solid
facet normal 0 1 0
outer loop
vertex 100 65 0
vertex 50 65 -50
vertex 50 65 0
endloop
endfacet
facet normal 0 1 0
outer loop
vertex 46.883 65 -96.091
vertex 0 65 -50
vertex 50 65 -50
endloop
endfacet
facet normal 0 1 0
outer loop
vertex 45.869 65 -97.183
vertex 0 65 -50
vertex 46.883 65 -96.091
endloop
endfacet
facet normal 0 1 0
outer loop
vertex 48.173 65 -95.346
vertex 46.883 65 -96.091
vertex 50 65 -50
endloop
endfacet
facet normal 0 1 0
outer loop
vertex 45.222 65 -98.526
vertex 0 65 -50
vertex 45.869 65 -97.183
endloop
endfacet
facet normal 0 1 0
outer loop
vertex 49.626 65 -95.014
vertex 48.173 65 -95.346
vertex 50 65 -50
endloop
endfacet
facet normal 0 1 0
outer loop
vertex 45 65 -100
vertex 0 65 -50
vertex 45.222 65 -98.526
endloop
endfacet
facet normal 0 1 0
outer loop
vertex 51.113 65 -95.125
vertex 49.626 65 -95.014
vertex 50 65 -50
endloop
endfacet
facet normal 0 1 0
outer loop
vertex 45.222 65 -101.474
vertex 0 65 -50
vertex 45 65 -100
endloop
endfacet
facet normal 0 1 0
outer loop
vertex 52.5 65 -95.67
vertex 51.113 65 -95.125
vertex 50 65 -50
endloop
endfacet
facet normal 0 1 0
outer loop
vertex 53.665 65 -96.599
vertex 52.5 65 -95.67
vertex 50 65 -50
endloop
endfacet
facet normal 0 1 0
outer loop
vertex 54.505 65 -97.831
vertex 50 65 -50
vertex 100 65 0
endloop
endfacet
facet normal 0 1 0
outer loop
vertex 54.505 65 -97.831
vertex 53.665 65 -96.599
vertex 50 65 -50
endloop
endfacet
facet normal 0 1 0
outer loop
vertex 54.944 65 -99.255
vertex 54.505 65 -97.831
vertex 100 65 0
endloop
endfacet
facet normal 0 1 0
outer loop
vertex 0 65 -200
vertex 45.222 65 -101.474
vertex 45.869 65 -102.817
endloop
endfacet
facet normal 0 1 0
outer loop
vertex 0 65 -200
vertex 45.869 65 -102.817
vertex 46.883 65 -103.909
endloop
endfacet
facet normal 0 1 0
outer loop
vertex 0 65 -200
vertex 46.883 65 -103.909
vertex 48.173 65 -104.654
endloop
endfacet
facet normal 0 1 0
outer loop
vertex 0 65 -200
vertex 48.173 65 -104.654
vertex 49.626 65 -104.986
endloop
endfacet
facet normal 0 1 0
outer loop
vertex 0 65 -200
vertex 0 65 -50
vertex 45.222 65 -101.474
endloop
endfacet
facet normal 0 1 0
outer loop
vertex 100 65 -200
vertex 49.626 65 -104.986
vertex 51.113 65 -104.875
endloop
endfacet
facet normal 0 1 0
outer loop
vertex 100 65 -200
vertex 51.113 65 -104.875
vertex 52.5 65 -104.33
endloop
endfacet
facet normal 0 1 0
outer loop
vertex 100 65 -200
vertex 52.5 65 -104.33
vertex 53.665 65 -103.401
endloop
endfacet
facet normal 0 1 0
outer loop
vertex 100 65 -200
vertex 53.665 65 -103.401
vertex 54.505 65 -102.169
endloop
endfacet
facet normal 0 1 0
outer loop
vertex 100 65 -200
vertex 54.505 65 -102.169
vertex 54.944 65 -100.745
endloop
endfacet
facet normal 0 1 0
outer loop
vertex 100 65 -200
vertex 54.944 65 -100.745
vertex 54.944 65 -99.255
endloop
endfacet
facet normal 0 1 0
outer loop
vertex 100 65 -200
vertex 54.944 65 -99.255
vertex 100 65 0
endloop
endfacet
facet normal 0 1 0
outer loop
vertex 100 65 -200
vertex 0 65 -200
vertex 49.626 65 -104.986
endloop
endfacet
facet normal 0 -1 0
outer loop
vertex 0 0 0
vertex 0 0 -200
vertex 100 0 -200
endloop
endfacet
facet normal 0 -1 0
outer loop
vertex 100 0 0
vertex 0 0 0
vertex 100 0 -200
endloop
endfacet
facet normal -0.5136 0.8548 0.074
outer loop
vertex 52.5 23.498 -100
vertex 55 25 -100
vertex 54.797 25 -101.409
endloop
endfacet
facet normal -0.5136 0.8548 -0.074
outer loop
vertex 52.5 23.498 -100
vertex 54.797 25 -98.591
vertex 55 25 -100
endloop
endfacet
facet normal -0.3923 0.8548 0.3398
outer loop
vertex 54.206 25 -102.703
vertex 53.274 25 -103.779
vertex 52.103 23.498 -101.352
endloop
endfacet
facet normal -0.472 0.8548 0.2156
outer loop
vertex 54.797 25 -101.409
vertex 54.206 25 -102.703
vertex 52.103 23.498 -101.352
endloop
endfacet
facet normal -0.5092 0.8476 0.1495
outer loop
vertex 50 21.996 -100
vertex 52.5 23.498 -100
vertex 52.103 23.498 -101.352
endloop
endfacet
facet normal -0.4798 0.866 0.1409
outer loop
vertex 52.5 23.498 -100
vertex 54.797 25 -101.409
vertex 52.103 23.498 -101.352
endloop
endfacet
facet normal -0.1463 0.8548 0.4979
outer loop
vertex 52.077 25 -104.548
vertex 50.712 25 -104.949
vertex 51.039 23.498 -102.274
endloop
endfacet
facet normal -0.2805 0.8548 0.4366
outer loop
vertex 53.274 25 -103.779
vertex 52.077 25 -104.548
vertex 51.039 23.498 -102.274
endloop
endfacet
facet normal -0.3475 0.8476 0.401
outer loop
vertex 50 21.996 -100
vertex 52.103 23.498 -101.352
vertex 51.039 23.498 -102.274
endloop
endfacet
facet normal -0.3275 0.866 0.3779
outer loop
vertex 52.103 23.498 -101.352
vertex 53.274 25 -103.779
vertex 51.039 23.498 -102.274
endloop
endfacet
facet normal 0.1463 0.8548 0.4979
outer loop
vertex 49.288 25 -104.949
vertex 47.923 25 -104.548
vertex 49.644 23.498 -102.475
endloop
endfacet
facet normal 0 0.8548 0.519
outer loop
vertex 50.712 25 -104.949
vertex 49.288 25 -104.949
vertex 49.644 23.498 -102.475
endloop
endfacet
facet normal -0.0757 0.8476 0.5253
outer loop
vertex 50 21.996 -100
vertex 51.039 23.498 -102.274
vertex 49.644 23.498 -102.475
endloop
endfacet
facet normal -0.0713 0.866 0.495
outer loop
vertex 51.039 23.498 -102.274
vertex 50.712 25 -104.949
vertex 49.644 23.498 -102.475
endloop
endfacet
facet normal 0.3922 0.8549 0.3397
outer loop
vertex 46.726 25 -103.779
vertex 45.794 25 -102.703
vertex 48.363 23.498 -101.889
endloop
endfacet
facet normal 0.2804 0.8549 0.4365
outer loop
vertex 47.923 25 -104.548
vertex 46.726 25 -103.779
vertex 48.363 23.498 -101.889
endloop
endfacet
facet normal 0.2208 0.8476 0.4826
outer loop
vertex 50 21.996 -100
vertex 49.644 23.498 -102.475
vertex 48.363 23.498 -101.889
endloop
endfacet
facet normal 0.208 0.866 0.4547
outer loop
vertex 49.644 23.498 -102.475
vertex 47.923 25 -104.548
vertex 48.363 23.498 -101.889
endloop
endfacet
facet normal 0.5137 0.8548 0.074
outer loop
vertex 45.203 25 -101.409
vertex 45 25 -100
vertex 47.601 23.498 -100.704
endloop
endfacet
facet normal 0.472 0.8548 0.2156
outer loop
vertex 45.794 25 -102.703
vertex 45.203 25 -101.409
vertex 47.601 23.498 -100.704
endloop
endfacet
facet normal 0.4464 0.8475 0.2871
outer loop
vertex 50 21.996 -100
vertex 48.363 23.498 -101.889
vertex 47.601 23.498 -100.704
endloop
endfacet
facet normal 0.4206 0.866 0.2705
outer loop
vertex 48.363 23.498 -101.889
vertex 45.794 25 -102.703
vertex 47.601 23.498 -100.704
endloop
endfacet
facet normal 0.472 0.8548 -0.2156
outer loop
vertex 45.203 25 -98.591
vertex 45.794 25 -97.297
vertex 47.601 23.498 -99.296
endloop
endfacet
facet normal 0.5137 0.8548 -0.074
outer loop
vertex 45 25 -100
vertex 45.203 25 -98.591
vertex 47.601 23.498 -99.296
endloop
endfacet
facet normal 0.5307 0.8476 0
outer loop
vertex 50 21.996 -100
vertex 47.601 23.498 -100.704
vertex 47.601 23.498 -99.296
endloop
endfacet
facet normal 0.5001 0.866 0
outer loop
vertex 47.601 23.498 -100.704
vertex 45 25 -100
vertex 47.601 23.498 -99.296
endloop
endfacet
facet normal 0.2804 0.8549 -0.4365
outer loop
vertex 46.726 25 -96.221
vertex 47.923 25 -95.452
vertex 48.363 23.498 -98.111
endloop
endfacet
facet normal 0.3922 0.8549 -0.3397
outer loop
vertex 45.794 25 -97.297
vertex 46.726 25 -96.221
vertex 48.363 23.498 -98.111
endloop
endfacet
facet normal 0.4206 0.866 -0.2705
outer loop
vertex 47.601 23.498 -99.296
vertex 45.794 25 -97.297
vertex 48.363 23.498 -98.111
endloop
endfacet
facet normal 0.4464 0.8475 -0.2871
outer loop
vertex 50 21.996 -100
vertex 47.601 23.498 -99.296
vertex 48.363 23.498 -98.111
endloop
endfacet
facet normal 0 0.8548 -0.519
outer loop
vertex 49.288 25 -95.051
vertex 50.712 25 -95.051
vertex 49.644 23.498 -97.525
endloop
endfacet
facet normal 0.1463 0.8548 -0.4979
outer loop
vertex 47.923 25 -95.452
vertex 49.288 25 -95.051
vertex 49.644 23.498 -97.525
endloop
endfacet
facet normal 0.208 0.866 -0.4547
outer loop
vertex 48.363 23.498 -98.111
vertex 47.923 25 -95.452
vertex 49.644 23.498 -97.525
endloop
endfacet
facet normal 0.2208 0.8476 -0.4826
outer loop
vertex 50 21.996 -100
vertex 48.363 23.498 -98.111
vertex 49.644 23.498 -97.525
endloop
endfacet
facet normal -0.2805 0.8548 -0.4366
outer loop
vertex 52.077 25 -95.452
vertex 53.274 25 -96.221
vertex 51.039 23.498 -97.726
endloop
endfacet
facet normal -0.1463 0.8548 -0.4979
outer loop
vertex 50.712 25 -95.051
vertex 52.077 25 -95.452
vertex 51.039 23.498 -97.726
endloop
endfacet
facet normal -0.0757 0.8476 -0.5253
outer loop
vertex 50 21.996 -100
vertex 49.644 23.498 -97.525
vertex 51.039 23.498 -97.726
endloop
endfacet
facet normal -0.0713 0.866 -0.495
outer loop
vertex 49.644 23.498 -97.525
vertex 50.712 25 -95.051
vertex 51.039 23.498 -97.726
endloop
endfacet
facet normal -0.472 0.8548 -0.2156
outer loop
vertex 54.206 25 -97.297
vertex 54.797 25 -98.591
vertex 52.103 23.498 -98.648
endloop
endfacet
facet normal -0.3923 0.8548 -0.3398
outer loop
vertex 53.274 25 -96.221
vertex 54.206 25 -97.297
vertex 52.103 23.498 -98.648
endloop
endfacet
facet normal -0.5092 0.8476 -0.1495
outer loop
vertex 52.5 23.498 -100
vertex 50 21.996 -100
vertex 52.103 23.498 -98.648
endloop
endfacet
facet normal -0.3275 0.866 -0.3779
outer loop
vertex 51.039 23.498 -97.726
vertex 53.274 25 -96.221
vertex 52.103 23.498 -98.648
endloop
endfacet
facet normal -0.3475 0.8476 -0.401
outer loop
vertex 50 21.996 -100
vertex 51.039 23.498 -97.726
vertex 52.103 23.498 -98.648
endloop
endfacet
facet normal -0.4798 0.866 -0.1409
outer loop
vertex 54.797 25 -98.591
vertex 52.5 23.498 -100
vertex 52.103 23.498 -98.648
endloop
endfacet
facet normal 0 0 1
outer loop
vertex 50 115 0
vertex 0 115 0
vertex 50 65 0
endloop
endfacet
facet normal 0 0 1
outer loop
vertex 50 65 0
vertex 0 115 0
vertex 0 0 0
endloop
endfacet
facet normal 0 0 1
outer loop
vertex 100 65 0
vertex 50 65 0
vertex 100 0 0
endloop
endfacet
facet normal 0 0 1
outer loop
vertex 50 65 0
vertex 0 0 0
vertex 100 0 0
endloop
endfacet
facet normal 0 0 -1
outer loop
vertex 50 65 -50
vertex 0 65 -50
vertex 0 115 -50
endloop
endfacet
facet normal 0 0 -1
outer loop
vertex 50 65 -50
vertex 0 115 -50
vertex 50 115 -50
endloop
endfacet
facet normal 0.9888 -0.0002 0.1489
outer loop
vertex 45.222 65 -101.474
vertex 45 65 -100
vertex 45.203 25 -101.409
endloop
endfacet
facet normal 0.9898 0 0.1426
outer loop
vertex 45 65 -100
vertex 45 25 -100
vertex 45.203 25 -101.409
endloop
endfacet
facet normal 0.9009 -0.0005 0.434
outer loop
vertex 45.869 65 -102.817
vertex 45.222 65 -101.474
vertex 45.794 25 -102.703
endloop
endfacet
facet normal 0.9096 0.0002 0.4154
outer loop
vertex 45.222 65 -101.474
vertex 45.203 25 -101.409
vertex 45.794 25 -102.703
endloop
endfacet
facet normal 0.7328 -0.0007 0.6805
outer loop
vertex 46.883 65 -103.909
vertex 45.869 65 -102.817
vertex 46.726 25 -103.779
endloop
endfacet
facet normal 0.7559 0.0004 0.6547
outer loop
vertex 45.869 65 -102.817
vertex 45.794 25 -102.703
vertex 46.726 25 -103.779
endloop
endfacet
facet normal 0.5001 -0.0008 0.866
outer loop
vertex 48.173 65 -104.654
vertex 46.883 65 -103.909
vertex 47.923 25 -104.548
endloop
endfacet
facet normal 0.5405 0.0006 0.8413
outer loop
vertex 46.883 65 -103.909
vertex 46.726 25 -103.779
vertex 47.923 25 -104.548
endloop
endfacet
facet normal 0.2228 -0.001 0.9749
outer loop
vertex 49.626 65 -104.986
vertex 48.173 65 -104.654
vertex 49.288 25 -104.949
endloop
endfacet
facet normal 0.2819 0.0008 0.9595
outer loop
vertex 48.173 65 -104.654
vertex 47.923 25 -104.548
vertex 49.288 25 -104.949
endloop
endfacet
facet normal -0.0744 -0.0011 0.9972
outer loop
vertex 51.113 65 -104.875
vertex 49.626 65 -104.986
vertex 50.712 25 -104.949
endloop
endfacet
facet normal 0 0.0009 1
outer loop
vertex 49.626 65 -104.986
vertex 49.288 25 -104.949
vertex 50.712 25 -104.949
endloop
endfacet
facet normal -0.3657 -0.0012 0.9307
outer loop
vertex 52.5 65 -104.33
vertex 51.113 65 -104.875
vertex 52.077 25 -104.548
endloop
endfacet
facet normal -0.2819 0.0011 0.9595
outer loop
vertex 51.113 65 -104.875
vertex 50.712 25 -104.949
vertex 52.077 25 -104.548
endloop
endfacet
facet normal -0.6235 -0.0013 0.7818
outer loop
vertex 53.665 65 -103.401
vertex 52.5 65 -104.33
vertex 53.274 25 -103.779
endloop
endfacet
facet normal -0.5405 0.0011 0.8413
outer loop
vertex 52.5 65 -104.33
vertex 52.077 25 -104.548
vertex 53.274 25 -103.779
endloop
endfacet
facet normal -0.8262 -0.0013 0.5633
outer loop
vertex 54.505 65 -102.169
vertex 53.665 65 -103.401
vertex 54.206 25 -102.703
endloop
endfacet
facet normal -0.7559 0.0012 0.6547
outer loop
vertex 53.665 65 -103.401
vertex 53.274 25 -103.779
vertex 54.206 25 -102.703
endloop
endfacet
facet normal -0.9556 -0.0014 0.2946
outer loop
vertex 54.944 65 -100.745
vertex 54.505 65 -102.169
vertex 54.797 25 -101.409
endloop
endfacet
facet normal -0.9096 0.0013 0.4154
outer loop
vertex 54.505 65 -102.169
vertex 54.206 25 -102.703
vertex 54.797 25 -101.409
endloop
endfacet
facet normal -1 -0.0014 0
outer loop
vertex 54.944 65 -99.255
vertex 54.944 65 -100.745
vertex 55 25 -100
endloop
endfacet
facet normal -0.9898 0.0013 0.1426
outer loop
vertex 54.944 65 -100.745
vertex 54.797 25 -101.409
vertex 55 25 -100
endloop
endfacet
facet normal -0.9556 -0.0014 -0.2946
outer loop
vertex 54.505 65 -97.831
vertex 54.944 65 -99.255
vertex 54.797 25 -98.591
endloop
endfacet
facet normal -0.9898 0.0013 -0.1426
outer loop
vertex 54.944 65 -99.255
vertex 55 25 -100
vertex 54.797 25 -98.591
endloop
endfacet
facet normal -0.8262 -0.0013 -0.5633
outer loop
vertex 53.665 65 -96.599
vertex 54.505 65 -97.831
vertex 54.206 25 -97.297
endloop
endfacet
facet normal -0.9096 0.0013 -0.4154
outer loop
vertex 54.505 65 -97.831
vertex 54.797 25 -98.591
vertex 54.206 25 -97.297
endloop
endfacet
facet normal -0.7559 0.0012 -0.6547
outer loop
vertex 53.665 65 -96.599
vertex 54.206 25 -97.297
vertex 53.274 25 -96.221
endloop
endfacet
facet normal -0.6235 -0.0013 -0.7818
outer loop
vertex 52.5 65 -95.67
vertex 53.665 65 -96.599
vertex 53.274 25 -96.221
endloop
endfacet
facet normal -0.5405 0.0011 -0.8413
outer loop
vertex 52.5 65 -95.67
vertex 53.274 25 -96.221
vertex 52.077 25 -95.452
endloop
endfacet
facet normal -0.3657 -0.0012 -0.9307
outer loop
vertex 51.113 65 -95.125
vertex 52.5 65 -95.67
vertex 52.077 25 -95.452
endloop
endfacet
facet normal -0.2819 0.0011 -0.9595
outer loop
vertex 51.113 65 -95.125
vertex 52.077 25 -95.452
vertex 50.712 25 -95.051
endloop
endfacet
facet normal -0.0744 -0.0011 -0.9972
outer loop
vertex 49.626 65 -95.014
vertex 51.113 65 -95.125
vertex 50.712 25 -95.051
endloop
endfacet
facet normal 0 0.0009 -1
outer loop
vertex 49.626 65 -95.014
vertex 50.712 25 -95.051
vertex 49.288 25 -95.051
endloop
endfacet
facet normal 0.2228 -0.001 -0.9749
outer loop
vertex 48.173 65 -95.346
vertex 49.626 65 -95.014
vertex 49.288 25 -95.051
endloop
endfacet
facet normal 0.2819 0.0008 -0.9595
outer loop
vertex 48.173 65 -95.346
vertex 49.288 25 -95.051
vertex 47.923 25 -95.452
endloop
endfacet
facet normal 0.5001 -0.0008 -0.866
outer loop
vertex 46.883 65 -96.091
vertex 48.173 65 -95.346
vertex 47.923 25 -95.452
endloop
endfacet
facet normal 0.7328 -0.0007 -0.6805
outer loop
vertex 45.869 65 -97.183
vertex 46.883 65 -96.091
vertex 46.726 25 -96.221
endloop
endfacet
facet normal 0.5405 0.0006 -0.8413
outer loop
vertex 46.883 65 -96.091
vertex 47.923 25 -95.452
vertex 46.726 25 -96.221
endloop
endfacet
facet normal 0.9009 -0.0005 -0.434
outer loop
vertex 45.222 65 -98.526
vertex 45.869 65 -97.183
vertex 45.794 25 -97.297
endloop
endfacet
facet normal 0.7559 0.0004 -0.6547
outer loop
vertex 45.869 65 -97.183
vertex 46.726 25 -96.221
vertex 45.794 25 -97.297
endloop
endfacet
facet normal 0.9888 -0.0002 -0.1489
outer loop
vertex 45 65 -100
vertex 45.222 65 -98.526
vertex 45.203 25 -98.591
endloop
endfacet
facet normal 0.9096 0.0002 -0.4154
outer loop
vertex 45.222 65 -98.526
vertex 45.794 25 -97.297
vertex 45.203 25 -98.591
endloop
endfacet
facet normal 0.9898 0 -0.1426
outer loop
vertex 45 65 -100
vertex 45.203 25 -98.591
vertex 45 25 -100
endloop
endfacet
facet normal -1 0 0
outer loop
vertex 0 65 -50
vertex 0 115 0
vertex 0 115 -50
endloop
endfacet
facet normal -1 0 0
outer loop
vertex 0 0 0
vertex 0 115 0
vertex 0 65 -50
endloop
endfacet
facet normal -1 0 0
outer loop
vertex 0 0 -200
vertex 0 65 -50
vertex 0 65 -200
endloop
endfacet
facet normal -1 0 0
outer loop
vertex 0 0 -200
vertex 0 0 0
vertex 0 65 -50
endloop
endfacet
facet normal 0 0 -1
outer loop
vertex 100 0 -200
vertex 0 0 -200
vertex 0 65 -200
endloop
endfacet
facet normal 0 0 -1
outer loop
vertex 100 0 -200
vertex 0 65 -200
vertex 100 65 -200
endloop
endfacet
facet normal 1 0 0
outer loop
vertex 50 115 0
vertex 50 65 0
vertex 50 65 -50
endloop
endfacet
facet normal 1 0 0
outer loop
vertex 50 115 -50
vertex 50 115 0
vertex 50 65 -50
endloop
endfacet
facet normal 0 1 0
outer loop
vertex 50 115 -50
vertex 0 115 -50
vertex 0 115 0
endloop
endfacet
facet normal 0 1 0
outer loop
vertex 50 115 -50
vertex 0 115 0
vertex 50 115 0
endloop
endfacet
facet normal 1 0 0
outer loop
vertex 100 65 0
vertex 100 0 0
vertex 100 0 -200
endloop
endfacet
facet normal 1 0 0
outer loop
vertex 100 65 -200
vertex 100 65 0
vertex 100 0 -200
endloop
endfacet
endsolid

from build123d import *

# Parameters (mm, degrees)
SKETCH1_W                  = 100
SKETCH1_H                  = 200
BOSS_EXTRUDE1_DEPTH        = 65
F_10_0MM_DOWEL_HOLE1_D     = 10
F_10_0MM_DOWEL_HOLE1_DEPTH = 40
F_10_0MM_DOWEL_HOLE1_TIP   = 3.004303095
SKETCH5_W                  = 50
SKETCH5_H                  = 50
BOSS_EXTRUDE2_DEPTH        = 50


with BuildPart() as part:
    # Sketch1 → Boss-Extrude1 (new body)
    with BuildSketch(Plane(origin=(0, 0, 0), x_dir=(1, 0, 0), z_dir=(0, 1, 0))):
        with Locations((50, 100)):
            Rectangle(SKETCH1_W, SKETCH1_H)
    extrude(amount=BOSS_EXTRUDE1_DEPTH)

    # Ø10.0mm Dowel Hole1
    with Locations(Plane(origin=(0, 65, 0), x_dir=(1, 0, 0), z_dir=(0, 1, 0))):
        with Locations((50, 100)):
            Hole(F_10_0MM_DOWEL_HOLE1_D / 2, depth=F_10_0MM_DOWEL_HOLE1_DEPTH)
            with Locations((0, 0, -(F_10_0MM_DOWEL_HOLE1_DEPTH + F_10_0MM_DOWEL_HOLE1_TIP / 2))):  # 118° drill point
                Cone(0, F_10_0MM_DOWEL_HOLE1_D / 2, F_10_0MM_DOWEL_HOLE1_TIP, mode=Mode.SUBTRACT)

    # Sketch5 → Boss-Extrude2 (add)
    with BuildSketch(Plane(origin=(0, 65, 0), x_dir=(1, 0, 0), z_dir=(0, 1, 0))):
        with Locations((25, 25)):
            Rectangle(SKETCH5_W, SKETCH5_H)
    extrude(amount=BOSS_EXTRUDE2_DEPTH)


solid = part.part
